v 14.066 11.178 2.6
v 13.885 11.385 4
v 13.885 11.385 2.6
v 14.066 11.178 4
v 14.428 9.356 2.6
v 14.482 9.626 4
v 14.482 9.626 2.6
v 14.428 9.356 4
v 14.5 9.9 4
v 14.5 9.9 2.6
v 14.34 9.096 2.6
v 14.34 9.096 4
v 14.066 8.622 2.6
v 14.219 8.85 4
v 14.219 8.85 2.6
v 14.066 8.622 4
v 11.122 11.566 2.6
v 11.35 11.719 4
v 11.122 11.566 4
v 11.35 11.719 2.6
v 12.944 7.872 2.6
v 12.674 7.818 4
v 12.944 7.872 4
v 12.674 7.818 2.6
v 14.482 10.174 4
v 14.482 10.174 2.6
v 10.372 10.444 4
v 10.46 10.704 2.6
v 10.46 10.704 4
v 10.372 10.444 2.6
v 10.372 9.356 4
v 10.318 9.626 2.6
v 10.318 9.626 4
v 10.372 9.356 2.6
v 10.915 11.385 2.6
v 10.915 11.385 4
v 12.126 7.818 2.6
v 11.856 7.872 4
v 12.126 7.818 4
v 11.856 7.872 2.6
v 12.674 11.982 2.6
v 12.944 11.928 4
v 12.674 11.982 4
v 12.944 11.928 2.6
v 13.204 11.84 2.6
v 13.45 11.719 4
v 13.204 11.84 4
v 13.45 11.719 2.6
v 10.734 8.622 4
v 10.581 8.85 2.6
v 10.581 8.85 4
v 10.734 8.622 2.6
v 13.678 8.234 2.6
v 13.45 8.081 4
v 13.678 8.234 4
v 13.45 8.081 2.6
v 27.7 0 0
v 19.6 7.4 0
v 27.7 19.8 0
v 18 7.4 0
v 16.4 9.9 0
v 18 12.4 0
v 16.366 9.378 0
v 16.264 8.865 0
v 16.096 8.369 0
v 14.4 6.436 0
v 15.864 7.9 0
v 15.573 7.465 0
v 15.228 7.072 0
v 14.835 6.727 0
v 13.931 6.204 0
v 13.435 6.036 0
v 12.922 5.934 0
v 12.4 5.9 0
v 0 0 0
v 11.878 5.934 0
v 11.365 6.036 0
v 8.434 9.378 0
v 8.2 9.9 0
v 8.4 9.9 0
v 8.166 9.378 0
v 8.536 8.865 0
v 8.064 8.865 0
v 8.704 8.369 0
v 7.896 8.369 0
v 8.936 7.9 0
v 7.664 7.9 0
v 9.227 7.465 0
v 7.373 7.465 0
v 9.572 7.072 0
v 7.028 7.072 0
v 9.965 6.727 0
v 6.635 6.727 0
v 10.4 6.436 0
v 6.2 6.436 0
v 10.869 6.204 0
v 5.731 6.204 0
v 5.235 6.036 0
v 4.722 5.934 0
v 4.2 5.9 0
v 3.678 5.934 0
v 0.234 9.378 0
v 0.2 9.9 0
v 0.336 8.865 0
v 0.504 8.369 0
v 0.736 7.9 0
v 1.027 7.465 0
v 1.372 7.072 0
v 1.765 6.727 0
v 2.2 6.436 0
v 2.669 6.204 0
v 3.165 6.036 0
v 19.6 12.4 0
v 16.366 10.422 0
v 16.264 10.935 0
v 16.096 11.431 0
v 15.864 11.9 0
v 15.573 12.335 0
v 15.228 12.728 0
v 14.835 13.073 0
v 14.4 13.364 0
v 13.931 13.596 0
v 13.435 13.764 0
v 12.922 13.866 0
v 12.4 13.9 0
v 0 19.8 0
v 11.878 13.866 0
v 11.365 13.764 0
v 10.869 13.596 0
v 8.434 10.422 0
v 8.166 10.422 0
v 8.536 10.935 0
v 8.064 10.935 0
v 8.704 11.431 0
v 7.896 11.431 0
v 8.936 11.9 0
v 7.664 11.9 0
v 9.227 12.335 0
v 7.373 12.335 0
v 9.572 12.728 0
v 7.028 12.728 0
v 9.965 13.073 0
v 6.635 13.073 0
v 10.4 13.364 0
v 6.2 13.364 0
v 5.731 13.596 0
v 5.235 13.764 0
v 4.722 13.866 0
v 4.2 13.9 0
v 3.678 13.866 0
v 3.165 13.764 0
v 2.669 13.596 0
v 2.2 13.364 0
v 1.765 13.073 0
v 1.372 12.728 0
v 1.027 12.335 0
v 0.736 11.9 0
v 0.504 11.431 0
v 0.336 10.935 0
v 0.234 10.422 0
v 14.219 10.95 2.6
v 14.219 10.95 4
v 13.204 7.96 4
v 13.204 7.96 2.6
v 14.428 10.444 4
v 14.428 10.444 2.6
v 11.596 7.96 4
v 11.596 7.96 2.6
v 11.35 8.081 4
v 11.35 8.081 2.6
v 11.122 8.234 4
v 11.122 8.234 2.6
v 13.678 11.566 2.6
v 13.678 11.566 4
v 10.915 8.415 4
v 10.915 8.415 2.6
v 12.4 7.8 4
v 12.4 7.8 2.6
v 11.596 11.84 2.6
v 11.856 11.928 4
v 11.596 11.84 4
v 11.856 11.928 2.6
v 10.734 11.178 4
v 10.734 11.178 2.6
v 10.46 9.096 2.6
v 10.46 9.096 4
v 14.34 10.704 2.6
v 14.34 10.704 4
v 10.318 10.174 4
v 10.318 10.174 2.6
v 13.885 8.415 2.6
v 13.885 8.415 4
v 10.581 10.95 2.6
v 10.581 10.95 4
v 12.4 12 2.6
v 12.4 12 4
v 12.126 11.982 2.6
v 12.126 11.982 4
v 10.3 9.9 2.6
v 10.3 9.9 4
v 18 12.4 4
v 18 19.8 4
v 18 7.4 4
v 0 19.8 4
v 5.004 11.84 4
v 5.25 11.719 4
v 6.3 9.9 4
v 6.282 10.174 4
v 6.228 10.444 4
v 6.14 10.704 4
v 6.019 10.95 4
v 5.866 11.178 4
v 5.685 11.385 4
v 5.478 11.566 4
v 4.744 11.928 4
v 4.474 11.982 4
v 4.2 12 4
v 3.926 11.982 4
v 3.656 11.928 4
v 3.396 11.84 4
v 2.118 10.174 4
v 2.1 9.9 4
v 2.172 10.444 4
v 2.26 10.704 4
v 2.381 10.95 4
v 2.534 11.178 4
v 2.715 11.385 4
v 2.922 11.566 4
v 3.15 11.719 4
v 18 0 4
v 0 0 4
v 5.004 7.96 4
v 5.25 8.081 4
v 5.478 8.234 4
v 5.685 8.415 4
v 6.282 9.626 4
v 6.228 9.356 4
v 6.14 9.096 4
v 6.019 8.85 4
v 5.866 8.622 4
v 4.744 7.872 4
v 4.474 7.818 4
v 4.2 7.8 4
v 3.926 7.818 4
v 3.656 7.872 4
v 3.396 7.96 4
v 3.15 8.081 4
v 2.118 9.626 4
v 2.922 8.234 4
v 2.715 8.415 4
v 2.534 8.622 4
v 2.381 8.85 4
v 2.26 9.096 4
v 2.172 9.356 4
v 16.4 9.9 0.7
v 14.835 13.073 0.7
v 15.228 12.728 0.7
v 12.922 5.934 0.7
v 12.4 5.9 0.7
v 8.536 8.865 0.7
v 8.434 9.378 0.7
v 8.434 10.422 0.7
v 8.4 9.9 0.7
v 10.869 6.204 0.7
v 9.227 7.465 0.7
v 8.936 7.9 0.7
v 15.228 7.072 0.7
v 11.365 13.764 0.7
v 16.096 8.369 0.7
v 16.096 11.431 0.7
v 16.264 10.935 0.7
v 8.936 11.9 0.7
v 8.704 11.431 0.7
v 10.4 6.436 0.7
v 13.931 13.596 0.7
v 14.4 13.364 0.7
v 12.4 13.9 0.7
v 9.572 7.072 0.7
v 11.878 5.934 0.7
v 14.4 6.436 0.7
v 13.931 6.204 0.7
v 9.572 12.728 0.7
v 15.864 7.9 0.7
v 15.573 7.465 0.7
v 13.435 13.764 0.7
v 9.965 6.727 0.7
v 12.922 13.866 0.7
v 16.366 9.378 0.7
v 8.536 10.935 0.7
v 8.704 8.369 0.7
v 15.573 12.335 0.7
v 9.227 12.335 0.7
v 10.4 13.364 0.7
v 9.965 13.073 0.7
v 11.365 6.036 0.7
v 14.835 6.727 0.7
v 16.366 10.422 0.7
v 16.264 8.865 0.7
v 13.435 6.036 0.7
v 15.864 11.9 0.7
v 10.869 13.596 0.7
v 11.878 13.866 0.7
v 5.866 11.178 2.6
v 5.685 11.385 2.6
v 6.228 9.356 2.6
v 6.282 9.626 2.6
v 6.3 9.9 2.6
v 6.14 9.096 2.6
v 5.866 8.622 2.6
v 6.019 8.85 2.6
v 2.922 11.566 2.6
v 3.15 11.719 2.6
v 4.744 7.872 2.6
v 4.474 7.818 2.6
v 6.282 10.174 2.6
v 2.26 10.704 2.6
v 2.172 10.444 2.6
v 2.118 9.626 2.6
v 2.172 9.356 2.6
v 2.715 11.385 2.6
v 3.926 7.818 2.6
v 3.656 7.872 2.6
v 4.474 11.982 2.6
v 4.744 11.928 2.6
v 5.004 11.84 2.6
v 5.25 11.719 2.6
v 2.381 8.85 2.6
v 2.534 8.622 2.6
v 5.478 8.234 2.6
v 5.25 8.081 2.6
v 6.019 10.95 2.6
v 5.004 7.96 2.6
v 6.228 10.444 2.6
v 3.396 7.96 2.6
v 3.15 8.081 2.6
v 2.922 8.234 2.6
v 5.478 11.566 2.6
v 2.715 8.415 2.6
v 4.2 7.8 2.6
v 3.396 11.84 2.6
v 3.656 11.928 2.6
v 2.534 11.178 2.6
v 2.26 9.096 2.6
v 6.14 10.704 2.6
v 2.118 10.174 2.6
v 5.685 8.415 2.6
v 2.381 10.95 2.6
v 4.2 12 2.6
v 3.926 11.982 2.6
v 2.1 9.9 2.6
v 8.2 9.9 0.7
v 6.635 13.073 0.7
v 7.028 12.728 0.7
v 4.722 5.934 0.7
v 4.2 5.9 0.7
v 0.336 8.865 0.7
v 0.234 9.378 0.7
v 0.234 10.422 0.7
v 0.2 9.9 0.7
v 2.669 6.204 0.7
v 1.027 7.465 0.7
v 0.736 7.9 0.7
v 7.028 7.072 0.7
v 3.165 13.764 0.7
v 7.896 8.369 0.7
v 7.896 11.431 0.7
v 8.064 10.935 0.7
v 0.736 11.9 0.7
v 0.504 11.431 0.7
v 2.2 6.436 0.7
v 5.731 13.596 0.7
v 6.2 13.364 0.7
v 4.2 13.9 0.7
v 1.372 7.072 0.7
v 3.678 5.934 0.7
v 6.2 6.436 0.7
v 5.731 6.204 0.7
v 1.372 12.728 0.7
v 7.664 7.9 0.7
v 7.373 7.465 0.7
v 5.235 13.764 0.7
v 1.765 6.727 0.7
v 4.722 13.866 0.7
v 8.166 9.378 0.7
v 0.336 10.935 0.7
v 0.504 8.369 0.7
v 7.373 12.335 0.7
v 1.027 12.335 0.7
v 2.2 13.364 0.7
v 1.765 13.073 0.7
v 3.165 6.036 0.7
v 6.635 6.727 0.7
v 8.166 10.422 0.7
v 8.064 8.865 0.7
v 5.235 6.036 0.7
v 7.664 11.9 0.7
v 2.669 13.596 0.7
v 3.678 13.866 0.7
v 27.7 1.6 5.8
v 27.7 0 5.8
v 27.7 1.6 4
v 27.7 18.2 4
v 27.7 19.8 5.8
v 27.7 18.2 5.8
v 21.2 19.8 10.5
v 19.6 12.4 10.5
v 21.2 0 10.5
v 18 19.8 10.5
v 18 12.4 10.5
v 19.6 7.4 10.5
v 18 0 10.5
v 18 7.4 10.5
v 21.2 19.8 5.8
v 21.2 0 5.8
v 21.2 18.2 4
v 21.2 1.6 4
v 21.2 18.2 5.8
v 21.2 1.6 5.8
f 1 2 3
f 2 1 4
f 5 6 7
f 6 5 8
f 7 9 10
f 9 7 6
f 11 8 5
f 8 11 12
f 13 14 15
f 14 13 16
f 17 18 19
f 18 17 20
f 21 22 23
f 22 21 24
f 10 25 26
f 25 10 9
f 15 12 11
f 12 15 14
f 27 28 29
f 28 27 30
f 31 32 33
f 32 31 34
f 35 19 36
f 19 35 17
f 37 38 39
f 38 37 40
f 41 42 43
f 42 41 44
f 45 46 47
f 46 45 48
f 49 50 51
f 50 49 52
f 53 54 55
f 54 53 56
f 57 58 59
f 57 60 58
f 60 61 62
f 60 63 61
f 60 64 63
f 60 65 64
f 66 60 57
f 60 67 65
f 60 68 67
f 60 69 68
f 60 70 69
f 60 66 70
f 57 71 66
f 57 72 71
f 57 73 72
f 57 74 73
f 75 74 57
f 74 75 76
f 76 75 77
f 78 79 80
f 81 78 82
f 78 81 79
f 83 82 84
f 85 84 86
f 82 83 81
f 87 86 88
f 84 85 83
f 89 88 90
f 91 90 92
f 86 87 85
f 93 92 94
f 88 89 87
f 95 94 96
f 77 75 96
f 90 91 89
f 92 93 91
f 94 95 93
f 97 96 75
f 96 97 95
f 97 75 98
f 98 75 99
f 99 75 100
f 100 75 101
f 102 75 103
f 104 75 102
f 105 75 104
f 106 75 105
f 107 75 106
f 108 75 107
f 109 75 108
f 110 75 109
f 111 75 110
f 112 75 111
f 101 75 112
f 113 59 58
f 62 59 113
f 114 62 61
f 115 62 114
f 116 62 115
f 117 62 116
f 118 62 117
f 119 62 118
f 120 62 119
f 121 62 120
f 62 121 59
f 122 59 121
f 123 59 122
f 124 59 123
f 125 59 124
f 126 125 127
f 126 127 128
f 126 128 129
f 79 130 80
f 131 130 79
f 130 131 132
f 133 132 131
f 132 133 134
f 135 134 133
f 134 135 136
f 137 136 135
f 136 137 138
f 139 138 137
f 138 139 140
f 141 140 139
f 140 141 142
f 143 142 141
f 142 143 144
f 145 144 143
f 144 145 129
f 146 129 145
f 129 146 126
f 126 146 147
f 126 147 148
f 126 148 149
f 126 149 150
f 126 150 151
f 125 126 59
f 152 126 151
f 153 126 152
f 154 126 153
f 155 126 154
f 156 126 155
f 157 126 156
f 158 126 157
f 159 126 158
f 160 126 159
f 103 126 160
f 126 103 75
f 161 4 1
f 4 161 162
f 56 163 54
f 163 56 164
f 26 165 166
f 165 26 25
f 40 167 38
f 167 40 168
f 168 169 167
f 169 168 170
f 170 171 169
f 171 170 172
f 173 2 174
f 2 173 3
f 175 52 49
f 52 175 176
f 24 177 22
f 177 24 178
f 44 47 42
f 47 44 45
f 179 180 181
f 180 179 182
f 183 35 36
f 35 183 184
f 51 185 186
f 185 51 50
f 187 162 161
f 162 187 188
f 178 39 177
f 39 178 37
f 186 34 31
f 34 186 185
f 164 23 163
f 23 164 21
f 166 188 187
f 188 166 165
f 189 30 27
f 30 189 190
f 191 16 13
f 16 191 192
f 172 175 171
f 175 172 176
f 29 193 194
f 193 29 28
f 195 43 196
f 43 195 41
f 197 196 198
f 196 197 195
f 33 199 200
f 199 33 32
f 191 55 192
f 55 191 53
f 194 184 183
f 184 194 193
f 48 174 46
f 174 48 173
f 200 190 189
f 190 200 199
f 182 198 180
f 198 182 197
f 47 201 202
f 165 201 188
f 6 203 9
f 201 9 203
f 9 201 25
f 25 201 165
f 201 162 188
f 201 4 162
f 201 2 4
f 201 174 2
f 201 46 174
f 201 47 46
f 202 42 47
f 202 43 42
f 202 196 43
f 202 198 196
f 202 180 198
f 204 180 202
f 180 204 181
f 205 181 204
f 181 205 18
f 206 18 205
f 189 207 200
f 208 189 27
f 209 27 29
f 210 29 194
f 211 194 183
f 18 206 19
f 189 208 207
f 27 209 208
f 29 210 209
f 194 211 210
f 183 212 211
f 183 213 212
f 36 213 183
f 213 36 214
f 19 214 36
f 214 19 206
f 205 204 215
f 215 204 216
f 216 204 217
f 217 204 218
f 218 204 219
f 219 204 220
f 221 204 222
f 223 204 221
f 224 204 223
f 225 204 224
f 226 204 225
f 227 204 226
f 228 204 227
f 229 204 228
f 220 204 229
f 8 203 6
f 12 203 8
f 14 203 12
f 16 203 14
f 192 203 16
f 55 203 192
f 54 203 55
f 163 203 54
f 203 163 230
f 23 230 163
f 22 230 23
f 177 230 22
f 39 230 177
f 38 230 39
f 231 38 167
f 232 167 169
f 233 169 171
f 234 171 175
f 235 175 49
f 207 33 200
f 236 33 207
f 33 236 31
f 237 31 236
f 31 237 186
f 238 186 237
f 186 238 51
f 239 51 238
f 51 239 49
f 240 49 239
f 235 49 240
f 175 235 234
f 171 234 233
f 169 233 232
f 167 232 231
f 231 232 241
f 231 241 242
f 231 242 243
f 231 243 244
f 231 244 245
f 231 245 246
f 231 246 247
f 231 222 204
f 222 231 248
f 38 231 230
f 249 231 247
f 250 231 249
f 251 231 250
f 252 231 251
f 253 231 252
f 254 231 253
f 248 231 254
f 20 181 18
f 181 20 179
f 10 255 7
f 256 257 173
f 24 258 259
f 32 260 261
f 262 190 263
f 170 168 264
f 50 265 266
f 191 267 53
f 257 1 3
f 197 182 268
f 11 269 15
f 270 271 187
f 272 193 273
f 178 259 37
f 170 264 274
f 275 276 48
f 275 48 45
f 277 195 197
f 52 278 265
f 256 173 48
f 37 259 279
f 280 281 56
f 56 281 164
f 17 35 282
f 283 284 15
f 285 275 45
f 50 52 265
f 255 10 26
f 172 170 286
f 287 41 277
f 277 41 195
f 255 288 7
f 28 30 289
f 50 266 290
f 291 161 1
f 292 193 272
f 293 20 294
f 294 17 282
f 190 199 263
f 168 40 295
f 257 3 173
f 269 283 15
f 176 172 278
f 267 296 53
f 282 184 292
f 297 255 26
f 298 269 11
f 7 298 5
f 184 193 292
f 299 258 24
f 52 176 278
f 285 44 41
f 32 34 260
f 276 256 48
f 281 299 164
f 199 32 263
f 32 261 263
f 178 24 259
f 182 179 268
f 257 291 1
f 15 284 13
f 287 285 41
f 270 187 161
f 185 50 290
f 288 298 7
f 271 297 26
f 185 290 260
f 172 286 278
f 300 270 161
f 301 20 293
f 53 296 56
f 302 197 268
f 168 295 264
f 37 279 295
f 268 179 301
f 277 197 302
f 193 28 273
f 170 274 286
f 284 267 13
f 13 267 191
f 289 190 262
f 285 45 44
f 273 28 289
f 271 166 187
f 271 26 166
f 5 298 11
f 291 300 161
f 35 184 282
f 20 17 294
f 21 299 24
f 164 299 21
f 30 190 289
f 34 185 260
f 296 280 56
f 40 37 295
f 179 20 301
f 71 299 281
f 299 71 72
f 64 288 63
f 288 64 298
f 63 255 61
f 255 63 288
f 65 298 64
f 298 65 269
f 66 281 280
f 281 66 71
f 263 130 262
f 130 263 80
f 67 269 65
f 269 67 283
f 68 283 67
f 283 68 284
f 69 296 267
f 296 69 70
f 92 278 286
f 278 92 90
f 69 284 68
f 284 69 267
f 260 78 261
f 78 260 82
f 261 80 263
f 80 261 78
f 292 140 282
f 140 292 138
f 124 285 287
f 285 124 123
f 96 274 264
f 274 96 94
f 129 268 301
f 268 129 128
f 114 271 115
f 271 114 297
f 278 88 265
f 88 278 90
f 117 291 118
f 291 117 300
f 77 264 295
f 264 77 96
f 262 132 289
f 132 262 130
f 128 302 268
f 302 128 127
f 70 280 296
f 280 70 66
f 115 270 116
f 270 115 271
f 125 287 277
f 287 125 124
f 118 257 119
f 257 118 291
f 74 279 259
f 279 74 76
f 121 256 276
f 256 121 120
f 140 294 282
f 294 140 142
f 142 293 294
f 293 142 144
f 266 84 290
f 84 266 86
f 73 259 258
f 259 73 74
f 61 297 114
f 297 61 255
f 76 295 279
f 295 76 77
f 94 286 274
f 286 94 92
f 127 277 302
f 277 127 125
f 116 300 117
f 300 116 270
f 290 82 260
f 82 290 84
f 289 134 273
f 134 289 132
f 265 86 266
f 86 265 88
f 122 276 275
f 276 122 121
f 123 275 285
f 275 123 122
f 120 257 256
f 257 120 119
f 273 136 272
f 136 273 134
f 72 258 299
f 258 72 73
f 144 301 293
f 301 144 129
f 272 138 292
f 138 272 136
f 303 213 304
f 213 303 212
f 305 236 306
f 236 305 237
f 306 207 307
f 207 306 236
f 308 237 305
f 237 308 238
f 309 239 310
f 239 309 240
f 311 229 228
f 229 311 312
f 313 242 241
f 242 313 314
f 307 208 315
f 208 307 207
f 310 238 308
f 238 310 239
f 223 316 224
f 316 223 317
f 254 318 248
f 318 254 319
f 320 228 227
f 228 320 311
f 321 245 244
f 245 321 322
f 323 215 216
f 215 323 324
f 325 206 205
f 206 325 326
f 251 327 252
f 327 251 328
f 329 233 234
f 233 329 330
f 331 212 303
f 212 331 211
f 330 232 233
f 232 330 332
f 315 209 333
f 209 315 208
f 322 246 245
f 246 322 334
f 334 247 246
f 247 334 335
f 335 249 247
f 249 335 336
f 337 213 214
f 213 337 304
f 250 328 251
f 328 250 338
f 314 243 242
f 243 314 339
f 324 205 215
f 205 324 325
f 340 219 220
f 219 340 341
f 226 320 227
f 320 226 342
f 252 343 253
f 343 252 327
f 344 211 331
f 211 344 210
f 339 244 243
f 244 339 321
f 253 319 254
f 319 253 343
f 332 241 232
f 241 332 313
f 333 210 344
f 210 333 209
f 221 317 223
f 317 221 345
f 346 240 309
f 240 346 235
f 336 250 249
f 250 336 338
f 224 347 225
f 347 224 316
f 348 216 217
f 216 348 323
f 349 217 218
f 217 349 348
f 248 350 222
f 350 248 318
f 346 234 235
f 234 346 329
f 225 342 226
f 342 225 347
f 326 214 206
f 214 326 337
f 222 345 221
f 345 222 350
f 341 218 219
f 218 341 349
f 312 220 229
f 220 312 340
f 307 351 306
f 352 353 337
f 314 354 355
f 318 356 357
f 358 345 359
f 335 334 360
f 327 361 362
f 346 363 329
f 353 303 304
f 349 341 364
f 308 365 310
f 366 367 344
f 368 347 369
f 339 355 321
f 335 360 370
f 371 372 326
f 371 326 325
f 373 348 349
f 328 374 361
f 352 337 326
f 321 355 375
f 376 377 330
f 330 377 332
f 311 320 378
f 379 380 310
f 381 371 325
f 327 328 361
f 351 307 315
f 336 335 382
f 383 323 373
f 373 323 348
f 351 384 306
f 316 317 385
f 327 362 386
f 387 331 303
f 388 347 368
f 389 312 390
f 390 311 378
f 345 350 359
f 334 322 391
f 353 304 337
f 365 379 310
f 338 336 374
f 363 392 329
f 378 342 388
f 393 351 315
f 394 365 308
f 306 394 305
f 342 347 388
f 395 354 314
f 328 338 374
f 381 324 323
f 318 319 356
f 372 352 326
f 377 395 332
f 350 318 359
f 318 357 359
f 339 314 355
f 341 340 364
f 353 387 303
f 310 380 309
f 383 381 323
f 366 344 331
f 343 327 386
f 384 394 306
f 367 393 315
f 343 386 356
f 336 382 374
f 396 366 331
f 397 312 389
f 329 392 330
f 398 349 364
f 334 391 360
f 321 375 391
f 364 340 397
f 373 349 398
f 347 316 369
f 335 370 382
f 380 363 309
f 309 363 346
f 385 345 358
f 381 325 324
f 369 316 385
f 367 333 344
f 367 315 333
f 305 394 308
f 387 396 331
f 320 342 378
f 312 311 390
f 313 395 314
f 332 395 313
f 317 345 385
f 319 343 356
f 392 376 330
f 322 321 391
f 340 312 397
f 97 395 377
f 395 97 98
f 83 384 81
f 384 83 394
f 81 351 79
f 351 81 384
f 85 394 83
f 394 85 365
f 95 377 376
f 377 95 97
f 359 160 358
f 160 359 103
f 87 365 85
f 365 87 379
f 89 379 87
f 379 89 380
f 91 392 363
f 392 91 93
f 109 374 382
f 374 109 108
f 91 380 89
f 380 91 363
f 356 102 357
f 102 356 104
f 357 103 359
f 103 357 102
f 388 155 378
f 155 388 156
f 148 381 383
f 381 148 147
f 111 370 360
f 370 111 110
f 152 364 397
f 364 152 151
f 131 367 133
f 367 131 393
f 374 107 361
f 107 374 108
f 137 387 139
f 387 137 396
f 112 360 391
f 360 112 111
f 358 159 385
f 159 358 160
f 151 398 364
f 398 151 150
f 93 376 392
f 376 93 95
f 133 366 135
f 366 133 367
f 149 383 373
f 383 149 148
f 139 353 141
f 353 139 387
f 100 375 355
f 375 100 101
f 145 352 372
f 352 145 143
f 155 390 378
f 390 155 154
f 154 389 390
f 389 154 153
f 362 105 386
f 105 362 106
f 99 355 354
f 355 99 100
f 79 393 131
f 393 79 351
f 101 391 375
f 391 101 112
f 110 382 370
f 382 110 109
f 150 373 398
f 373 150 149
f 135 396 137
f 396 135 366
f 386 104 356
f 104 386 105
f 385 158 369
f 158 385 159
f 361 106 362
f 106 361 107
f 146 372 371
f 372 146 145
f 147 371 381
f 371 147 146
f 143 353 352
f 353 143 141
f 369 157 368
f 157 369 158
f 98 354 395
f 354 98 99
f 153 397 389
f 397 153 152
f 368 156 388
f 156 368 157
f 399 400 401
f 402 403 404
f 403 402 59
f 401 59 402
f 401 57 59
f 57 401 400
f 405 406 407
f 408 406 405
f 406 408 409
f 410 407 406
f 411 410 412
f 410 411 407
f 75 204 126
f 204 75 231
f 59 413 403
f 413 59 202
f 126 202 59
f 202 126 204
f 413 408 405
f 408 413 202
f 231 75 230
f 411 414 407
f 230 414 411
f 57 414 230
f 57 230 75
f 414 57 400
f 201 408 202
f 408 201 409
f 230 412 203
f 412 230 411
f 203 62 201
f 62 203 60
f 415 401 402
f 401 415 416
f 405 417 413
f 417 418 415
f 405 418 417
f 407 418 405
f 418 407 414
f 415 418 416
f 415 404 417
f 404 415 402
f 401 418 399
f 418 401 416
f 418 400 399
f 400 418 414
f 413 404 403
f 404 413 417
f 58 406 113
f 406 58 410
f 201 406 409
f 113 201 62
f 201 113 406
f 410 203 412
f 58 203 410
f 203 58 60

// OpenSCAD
// Parametric holder to affix a sliding bush to a flat platform, hanging off the side of the platform, with the bearing top in line with the platform. Designed to snap onto the bearing, and to be printed on its side to maximise strength.

// a is the base 'plate'
// b is the bush
// c is the upright spacer to offset the bush from the chipboard
// d is the cable tie slot
// h is screw dimensions
// f is the side flanges to locate the bearing
$fn=48;
a1 = 18.0; // Holder flat part width (Just to the chipboard edge)
// a1 = 24.0; // Original version
a3 = 4.0; // Holder flat part thickness
bo = 13.0; // Bush OD
bi = 8; // Bush ID
b3 = 15; // Bush length
zl = 0.8; // Shaft clearances.
c1 = 3.2; // Bush offset from chipboard. Multiple of 0.4, just enough to clear cable tie
d1 = 1.6; // Cable tie slot depth
d2 = 5; // Cable tie slot width
hi = 4.2; // Screw hole id
ho = 8; // Screw countersink hole size
l = 1; // Screw hole guide size
f2 = 1.6; // Bush side holding flange
f3 = 1.8; // Bush side holding flange
p1 = 5.6; // hole 1 distance
// p1 = 8; // Original version
p2 = 13.8; // hole 2 distance
// p2 = 19.2; // Original version

a2 = b3 + f2*2 + zl*2;

module screw_hole(d1, d2, h1, h2) {
    // d1: hole id
    // d2: countersink hole id
    // h2: Total hole length
    union() {
        // Small hole all the way through
        cylinder(h2, d=d1);
        translate([0,0,h1]) cylinder((d2-d1)/2, d1=d1, d2=d2);
        translate([0,0,h1+(d2-d1)/2]) cylinder(h2-h1-(d2-d1)/2, d=d2);
    }
}

difference() {
    // Base block
    cube([a1+c1+bo/2,a2,a3+bo/2]);
    // Cutout for chipboard
    translate([0,0,a3]) cube([a1,a2,bo/2]);
    // Bush
    translate([a1+c1,f2,a3]) cube([bo,b3+2*zl,bo]);
    // bush end stops/shaft clearance
    translate([a1+c1,0,a3+f3]) cube([bo,a2,bo]);
    // Slots for cable ties
    translate([a1,(a2-d2)/2,0]) cube([d1,d2,a3+bo/2]);
    // Screw holes
    translate([a1-p1,a2/2,a3]) rotate([180, 0, 0]) screw_hole(hi,ho, 1.4, a3);
    translate([a1-p2,a2/2,a3]) rotate([180, 0, 0]) screw_hole(hi,ho, 1.4, a3);
    // Cutout for the mounting/alignment screw
    // Uncomment for version with cutout
    // translate([a1-12,a2-21,0]) cylinder(a3,r=7);
}
